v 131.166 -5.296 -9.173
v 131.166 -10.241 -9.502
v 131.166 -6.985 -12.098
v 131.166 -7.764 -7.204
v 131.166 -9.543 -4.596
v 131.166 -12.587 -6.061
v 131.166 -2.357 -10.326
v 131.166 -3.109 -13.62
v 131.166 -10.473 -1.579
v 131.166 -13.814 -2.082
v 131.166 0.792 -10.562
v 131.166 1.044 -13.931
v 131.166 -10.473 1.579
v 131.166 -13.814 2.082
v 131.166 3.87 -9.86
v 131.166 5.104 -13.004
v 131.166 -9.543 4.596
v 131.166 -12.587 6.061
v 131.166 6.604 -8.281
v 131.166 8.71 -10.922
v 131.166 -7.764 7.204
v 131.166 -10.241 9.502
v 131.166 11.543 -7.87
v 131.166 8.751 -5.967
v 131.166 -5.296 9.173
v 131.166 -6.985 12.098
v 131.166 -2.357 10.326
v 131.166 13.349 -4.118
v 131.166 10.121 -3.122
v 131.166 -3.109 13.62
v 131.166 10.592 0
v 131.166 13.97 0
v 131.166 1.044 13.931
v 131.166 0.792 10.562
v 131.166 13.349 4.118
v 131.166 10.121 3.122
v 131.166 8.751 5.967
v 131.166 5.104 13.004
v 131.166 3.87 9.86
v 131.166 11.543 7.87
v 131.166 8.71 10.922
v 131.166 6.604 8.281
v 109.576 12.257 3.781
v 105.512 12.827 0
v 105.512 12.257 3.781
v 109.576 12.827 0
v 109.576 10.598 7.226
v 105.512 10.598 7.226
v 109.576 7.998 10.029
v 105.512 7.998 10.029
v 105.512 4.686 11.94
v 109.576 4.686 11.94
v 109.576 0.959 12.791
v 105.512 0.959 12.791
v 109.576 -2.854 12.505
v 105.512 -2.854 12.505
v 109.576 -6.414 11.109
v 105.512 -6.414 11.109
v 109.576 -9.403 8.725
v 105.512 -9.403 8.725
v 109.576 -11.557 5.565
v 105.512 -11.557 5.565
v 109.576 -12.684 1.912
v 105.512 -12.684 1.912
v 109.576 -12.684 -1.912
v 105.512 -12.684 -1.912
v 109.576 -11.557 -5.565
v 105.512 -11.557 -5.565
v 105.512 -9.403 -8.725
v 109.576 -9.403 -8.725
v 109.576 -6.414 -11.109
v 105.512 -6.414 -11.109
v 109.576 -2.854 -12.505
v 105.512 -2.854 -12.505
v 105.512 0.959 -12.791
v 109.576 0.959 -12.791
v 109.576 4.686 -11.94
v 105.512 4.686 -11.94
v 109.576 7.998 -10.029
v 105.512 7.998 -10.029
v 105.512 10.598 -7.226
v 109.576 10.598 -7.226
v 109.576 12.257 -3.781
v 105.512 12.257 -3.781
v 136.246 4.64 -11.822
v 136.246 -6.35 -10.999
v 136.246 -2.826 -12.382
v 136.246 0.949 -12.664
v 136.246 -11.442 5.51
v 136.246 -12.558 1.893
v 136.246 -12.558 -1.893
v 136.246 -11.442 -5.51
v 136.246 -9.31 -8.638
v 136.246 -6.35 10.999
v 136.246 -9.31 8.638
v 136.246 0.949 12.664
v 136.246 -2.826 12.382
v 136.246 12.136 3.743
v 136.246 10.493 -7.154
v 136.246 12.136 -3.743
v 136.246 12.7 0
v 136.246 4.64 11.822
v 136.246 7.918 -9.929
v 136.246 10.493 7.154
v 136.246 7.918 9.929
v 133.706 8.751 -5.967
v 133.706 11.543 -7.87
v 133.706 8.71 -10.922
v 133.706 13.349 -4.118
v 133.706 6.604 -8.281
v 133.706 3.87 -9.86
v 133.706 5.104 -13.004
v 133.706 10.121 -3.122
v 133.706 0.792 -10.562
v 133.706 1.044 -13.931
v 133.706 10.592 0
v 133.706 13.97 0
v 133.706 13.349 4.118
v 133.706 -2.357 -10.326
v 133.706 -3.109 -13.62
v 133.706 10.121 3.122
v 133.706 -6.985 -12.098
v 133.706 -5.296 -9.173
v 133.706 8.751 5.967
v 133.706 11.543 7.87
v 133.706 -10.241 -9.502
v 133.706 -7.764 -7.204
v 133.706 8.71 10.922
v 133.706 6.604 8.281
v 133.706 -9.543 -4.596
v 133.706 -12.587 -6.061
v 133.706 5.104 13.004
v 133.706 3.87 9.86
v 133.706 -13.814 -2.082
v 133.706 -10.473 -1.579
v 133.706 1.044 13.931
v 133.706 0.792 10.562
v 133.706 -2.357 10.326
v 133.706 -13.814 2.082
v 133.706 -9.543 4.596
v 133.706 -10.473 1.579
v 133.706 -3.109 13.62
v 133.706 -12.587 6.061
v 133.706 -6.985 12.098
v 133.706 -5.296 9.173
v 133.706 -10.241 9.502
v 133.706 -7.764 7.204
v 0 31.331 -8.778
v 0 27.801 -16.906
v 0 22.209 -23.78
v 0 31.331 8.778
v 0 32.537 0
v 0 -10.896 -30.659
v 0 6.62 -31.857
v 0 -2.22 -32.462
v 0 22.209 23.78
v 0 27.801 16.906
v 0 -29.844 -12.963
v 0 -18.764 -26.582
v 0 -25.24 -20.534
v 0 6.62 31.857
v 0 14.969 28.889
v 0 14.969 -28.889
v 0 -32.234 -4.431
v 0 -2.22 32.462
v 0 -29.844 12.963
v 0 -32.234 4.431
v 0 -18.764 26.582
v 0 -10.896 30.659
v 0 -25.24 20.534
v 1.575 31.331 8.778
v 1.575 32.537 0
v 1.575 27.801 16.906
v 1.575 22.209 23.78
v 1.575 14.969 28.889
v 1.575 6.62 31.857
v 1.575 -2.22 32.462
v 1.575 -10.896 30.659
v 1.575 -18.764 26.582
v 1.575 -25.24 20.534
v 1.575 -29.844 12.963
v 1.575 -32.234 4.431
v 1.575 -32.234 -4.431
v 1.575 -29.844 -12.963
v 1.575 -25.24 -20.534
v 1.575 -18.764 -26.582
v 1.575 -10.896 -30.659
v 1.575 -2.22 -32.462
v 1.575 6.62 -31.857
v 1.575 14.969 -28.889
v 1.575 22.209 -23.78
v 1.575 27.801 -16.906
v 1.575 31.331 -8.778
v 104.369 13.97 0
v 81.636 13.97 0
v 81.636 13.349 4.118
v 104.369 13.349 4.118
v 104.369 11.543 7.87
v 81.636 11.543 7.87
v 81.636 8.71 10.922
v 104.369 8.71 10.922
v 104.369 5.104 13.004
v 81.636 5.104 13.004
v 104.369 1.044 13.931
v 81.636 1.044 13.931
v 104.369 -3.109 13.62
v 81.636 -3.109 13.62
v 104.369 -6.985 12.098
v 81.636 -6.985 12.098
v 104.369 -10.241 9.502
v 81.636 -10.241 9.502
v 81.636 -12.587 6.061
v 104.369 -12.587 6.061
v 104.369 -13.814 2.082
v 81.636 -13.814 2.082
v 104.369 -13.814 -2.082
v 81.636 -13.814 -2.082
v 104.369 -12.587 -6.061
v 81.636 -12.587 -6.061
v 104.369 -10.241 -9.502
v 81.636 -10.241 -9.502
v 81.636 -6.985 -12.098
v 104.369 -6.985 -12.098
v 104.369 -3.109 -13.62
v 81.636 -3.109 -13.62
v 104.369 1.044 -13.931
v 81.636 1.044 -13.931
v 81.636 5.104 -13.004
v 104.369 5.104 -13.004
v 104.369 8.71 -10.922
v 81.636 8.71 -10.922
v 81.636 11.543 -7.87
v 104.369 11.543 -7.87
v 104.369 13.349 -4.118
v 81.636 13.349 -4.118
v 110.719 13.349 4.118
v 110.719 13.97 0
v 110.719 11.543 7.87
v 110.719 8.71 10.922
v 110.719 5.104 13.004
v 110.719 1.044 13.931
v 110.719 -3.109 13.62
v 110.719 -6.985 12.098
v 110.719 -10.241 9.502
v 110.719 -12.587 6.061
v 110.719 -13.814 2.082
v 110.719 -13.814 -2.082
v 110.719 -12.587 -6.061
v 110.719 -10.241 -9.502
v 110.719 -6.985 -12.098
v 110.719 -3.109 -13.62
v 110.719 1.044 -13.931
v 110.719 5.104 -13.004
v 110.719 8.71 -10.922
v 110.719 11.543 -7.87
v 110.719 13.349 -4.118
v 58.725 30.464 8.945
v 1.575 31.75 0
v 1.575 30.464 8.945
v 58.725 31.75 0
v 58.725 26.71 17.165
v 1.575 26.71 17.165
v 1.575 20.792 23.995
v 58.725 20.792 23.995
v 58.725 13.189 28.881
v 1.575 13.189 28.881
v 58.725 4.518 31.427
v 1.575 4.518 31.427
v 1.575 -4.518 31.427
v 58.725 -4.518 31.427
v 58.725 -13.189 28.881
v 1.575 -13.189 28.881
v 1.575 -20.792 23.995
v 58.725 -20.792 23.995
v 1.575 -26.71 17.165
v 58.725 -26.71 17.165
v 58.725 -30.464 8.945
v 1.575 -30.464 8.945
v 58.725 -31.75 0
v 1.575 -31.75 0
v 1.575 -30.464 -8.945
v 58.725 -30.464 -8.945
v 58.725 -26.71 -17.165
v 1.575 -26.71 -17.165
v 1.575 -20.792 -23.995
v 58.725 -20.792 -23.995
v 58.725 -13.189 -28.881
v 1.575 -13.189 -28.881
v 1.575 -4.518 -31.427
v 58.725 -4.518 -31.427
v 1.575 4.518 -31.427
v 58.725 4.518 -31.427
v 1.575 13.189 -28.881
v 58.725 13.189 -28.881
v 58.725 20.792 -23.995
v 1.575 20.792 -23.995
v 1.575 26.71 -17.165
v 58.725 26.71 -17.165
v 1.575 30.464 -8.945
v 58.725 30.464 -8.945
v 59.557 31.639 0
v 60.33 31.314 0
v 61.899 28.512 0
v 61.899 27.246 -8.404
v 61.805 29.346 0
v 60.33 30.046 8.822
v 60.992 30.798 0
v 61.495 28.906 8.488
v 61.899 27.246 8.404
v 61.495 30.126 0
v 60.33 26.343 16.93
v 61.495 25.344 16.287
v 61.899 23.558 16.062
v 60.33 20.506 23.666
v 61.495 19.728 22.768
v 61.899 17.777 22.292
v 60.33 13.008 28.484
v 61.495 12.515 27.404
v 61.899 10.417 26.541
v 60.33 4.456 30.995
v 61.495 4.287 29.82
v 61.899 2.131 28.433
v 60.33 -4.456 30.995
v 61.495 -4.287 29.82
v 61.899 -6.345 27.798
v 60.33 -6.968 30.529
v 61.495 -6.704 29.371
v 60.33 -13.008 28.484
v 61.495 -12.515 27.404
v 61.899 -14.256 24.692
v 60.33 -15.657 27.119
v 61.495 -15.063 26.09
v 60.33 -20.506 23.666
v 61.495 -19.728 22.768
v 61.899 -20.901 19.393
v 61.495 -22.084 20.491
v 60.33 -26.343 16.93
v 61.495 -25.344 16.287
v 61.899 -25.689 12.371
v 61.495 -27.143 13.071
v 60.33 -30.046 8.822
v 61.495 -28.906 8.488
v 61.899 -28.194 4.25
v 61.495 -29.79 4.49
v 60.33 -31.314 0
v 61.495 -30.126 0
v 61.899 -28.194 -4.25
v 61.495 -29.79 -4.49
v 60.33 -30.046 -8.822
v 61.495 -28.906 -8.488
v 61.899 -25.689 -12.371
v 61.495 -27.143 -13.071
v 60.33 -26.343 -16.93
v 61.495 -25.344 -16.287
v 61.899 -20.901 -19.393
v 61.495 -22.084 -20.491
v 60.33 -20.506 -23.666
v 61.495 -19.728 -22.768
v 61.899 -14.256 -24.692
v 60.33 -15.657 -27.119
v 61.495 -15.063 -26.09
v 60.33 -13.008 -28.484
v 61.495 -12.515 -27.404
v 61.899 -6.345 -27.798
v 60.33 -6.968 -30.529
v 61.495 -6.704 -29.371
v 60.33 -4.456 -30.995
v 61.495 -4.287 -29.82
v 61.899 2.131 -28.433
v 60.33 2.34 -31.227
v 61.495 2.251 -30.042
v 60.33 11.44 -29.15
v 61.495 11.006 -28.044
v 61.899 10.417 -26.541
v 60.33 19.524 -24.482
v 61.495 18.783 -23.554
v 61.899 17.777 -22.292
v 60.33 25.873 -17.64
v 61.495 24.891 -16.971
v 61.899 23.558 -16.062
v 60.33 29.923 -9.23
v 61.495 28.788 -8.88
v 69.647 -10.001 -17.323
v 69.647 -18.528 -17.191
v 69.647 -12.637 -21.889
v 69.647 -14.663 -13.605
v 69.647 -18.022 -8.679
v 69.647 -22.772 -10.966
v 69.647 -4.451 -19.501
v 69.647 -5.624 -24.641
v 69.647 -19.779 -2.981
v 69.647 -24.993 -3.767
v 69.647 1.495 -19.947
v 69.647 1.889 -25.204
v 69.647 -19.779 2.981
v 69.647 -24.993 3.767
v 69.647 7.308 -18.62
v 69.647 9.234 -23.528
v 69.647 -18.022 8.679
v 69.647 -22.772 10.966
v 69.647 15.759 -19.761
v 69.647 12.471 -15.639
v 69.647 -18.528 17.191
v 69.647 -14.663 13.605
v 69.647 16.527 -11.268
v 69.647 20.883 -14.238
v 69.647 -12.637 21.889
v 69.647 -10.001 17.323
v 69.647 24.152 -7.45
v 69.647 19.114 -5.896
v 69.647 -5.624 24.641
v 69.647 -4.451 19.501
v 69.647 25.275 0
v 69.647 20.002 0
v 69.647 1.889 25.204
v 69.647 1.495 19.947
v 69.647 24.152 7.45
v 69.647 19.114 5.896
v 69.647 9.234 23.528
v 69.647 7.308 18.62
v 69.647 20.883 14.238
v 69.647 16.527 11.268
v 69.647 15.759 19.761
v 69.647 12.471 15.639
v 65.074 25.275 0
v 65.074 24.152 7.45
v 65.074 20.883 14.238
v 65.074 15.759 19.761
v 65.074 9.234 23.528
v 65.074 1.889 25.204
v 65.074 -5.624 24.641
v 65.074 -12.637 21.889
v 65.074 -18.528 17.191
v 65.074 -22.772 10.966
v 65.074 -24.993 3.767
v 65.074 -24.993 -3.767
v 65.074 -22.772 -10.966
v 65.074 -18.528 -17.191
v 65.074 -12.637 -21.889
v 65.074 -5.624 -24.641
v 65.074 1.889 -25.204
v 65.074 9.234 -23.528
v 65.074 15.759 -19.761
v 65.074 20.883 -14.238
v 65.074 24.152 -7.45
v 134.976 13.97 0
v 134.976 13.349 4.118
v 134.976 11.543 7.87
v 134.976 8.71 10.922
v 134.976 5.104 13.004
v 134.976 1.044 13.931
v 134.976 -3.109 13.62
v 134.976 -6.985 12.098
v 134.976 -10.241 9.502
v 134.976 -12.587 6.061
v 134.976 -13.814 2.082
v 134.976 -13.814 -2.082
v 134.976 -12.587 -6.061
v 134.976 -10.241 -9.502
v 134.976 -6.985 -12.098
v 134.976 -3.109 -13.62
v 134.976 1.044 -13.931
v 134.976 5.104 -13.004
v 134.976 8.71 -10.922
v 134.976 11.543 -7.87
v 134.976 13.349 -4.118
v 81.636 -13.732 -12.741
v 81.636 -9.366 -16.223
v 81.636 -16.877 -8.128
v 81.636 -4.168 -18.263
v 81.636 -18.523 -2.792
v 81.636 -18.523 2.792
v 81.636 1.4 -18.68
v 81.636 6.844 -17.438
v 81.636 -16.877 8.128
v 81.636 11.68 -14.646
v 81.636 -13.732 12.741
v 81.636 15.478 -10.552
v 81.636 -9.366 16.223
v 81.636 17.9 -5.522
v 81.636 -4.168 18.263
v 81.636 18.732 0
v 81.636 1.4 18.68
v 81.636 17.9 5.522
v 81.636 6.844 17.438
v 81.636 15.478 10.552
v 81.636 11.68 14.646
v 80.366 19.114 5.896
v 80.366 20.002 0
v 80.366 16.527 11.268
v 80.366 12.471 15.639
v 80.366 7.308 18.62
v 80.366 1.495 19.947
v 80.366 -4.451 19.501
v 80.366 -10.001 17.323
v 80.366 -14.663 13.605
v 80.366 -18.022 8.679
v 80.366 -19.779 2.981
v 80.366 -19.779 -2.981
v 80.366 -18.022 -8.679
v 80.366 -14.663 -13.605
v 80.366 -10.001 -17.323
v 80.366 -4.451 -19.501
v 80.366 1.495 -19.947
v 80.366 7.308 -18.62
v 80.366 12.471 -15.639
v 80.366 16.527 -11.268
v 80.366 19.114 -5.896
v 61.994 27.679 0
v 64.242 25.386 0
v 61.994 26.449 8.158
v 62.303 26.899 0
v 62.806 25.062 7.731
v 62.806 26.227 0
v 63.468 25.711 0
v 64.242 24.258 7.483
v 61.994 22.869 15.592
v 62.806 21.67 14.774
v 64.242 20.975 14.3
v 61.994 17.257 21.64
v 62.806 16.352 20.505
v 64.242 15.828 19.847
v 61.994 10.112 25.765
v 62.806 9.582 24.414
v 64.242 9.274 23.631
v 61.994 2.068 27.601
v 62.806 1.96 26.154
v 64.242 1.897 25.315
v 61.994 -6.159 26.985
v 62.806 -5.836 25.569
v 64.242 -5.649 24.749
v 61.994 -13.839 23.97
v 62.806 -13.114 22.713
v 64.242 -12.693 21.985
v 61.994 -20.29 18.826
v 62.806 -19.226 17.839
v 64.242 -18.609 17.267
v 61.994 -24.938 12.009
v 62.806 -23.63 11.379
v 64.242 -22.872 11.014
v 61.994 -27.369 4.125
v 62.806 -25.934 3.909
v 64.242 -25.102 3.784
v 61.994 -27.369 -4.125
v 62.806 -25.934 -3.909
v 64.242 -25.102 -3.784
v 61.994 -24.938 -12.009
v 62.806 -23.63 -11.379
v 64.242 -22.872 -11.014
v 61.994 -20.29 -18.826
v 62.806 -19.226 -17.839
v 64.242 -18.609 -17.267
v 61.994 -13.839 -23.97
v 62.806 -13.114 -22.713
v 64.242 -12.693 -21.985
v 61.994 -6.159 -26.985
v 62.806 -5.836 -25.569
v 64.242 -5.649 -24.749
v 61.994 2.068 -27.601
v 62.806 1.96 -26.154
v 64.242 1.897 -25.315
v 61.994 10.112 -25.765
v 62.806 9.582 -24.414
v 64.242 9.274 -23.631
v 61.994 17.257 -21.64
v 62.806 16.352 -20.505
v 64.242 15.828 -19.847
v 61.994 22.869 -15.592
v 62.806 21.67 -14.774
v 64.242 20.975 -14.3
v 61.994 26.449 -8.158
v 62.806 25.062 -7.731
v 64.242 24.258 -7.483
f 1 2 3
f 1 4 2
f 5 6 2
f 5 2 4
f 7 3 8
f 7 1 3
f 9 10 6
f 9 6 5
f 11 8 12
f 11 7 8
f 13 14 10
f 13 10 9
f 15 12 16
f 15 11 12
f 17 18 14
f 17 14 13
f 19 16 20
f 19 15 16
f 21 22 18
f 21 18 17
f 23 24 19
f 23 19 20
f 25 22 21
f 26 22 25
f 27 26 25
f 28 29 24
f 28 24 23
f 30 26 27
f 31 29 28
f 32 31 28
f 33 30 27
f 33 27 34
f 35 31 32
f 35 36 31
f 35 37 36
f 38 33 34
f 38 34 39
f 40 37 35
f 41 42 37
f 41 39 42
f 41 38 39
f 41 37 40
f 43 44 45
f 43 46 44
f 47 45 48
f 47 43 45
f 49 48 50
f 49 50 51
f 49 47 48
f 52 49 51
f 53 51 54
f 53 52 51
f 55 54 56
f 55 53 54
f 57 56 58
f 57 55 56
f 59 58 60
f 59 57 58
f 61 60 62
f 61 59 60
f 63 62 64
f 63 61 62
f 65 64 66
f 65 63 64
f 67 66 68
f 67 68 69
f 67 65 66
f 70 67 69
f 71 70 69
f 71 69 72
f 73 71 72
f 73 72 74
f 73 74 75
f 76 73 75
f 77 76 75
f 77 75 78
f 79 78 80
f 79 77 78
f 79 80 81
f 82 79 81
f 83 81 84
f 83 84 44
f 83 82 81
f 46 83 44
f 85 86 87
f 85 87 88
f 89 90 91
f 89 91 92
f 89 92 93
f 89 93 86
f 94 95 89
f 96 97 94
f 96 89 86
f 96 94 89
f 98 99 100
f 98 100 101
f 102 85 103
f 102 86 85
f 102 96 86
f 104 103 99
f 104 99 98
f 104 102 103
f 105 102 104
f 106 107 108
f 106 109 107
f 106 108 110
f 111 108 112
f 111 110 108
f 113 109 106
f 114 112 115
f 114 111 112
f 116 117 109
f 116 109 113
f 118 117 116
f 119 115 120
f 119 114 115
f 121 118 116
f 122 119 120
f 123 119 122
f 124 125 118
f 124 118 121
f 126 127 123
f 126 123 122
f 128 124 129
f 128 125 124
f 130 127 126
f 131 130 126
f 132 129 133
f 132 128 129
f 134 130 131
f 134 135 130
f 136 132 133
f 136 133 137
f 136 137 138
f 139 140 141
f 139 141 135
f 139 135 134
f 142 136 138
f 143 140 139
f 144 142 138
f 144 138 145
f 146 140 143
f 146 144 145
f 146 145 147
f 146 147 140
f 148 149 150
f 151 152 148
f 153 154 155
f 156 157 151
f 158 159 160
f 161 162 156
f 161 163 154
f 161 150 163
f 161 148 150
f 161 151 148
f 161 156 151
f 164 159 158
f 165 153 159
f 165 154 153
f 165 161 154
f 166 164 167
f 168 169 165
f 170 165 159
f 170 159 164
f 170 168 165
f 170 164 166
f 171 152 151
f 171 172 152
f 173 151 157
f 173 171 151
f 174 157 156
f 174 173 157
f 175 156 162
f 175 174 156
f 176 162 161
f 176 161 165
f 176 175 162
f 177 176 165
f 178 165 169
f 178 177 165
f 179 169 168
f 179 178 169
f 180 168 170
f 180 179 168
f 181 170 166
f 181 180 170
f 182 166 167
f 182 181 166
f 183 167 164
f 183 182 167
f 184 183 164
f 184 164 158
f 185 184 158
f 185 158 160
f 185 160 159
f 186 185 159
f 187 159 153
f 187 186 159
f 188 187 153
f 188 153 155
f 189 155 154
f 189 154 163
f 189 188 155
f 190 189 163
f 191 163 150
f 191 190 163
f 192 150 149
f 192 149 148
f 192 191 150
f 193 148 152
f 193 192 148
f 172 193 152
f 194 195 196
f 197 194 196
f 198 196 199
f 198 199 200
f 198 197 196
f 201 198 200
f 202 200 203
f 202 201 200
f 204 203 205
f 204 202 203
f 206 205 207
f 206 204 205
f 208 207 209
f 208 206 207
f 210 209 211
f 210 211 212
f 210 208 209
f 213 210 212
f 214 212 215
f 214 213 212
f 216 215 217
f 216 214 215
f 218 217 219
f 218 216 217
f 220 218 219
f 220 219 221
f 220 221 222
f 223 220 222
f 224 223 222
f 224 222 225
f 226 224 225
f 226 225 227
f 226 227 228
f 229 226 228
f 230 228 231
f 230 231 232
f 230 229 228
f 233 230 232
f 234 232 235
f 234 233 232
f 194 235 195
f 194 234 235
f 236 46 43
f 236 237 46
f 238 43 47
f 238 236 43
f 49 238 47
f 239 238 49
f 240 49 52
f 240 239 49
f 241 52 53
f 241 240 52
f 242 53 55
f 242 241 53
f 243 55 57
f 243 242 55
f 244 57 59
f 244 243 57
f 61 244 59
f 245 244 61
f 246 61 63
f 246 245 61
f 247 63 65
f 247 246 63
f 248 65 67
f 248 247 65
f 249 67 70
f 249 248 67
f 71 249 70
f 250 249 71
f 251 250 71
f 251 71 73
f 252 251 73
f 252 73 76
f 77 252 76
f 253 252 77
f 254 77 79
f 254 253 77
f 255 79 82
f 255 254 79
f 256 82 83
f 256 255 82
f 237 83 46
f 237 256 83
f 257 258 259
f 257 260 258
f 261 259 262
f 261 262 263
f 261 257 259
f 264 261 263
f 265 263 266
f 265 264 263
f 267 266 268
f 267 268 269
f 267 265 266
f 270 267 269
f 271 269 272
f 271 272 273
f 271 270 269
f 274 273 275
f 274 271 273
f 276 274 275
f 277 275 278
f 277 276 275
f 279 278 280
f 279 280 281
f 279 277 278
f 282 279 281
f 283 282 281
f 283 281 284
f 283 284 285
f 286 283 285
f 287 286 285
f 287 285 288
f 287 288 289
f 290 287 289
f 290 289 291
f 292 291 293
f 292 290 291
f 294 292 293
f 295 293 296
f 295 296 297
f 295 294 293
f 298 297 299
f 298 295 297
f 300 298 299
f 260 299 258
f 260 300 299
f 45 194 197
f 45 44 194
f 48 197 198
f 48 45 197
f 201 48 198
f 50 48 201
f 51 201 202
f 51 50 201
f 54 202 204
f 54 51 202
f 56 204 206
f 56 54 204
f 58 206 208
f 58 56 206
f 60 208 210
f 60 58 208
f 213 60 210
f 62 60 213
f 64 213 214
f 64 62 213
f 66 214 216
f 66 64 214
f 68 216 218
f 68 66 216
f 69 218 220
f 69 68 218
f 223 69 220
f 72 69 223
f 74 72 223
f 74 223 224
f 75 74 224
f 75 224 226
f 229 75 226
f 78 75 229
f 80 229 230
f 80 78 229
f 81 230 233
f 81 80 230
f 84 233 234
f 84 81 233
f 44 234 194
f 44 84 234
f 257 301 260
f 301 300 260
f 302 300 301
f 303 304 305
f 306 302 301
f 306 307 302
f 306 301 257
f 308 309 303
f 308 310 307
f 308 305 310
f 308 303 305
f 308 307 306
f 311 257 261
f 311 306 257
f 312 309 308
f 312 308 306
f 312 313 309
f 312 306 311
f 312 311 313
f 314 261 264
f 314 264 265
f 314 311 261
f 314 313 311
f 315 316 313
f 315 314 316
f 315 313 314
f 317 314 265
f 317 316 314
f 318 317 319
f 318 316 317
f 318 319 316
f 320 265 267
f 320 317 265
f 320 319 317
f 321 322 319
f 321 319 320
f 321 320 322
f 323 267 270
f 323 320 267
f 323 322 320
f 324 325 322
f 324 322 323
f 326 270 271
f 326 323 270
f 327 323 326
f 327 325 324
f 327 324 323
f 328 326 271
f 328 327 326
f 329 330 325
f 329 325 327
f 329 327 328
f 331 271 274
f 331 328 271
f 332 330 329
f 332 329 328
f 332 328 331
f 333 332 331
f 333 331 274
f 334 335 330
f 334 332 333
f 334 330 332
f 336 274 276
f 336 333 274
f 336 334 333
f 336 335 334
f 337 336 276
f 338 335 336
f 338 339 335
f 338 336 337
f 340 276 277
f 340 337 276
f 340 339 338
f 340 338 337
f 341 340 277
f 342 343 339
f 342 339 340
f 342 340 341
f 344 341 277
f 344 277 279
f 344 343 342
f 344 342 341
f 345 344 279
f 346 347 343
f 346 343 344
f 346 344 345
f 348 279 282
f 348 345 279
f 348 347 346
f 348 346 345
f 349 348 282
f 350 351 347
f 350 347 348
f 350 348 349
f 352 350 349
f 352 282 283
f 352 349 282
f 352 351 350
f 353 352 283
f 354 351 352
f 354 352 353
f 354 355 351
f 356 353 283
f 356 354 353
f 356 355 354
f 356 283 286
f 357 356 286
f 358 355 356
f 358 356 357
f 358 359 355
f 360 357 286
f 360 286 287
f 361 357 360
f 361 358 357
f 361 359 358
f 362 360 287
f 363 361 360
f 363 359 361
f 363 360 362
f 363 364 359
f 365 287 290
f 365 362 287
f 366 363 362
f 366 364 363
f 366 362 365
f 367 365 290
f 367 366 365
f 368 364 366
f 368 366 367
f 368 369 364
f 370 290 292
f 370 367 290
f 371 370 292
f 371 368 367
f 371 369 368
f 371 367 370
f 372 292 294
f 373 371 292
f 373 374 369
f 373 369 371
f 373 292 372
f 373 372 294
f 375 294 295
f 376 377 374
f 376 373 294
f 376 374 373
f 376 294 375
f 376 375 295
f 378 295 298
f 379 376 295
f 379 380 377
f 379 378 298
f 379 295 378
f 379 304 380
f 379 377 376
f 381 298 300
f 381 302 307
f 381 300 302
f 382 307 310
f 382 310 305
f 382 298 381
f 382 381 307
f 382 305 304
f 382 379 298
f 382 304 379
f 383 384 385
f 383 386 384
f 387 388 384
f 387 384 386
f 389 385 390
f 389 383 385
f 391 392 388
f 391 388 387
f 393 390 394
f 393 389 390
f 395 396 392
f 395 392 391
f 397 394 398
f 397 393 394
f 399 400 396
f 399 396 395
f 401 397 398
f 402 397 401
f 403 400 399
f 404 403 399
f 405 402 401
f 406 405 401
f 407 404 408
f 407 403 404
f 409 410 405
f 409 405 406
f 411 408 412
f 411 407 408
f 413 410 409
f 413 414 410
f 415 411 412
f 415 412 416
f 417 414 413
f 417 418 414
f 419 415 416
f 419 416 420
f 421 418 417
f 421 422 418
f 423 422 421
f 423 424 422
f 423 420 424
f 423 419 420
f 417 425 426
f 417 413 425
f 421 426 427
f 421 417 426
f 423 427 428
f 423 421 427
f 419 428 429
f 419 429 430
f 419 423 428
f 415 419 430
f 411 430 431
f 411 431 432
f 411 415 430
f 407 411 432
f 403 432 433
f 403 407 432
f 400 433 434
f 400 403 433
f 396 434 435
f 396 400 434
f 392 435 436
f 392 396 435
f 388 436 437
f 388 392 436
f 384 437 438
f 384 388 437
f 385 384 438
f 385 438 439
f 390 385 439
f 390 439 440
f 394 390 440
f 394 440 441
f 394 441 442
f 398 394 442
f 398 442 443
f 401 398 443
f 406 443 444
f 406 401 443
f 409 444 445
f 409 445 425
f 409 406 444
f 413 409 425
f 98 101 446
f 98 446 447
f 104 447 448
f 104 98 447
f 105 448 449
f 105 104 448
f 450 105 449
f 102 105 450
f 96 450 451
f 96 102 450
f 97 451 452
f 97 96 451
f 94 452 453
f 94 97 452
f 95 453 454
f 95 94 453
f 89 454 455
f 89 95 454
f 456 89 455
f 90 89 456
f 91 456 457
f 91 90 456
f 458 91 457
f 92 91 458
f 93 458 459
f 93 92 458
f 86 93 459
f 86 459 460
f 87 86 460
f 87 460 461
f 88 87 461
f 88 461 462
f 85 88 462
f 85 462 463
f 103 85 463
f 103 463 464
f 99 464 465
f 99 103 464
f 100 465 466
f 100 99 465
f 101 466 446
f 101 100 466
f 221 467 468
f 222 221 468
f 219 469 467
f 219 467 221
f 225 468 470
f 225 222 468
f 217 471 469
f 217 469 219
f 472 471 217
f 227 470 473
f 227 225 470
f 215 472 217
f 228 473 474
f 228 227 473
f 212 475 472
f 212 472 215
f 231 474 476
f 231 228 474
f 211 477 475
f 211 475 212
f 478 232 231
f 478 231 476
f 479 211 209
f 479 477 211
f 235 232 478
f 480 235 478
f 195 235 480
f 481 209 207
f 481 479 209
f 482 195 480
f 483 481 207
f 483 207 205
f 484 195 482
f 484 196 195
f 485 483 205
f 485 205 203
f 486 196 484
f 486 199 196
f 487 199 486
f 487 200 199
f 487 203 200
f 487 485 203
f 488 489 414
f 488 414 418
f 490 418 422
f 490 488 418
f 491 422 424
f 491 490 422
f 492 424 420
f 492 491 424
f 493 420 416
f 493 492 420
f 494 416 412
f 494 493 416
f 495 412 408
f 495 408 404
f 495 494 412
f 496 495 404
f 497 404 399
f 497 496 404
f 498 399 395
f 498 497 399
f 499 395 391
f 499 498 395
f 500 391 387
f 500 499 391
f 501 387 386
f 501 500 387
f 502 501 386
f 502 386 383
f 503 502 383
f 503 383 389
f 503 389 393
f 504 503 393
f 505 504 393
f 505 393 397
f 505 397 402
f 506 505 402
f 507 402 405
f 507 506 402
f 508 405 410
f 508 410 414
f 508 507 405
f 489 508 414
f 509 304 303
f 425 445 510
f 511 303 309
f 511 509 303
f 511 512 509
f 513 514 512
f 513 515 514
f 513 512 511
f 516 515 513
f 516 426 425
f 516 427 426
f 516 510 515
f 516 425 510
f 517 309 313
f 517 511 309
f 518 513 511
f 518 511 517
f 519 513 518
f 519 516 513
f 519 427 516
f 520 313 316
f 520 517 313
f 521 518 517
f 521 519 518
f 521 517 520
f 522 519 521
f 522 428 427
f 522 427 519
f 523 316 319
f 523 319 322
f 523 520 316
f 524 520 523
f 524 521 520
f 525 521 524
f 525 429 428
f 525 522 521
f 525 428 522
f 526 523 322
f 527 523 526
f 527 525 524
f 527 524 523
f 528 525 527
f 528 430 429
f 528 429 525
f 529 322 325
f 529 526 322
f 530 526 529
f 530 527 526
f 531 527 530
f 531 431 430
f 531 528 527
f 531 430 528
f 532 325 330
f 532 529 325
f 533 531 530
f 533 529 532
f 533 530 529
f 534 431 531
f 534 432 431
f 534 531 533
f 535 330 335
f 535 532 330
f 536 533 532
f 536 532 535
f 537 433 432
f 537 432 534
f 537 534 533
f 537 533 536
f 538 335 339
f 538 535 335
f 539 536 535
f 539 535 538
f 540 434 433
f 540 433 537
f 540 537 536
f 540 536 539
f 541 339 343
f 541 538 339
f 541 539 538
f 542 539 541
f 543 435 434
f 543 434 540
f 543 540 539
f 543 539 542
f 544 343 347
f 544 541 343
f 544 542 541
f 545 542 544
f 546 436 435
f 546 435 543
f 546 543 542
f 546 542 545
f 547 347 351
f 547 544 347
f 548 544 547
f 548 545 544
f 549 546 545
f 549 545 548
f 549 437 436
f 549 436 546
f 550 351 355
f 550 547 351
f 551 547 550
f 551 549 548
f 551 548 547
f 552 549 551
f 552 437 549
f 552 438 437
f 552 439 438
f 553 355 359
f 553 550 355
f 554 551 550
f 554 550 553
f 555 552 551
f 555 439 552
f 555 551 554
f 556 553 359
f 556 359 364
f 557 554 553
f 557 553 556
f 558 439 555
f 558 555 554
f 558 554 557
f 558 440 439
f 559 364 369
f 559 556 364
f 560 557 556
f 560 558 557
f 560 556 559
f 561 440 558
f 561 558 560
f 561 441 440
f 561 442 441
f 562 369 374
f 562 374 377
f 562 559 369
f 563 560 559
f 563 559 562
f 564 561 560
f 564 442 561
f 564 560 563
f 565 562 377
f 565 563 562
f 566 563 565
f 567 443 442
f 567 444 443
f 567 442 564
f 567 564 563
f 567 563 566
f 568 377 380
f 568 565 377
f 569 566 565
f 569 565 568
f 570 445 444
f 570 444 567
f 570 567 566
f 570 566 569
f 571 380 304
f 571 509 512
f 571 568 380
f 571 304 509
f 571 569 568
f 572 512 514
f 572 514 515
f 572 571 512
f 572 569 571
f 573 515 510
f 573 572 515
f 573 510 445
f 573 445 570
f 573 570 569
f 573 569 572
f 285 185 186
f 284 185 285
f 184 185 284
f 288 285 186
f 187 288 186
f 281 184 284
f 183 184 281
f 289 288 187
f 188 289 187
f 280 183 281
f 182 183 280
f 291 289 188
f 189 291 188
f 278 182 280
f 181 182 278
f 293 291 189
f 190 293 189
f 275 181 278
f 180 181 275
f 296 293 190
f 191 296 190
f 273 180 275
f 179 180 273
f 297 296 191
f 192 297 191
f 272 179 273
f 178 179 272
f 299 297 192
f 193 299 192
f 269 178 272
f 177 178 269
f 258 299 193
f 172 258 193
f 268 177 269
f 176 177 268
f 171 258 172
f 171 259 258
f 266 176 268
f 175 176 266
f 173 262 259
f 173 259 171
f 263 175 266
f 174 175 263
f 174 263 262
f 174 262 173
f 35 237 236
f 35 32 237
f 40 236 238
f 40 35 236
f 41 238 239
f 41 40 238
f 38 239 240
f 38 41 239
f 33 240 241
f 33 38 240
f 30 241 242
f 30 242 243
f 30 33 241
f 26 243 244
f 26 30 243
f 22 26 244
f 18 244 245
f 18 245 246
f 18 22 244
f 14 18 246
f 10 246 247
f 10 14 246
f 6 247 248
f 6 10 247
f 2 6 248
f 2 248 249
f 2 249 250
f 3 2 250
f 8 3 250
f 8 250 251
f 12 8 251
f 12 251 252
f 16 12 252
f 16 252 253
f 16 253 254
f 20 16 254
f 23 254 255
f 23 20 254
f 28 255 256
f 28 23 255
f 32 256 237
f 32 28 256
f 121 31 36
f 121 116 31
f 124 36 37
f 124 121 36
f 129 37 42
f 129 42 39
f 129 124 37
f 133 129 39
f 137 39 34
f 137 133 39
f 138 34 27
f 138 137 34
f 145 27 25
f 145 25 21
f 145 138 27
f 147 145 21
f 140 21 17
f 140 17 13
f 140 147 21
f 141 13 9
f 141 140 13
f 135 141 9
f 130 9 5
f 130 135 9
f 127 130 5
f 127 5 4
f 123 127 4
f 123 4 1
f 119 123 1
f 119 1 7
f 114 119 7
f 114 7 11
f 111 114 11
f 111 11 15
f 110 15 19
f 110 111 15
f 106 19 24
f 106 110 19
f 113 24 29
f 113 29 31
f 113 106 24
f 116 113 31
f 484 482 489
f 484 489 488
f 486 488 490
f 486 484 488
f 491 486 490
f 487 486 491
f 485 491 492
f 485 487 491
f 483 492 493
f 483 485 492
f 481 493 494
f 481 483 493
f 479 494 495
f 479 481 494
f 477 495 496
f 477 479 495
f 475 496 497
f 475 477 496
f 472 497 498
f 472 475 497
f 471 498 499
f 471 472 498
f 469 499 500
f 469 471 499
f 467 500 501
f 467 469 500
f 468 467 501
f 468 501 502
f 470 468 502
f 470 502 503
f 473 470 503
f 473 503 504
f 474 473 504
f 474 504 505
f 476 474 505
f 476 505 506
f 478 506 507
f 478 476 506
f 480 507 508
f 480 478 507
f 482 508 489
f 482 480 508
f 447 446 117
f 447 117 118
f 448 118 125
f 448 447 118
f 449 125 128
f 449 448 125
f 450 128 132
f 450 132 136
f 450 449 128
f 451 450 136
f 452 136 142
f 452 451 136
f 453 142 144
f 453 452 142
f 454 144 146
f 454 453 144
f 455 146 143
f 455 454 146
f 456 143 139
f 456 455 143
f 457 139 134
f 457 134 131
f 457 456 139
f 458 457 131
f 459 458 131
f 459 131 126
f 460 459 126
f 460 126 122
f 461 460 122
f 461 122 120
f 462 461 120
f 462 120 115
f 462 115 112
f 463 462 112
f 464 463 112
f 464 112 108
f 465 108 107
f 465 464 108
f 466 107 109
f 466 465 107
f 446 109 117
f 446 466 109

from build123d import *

# Parameters (mm, degrees)
CHAMFER1_SIZE = 1.27


with BuildPart() as part:
    # Sketch1 → Revolve1 (revolve)
    with BuildSketch(Plane.XY):
        with BuildLine():
            Line((0, 0), (0, 32.5374))
            Line((0, 32.5374), (1.5748, 32.5374))
            Line((1.5748, 32.5374), (1.5748, 31.75))
            Line((1.5748, 31.75), (58.7248, 31.75))
            ThreePointArc((58.7248, 31.75), (60.991879668, 30.797830353), (61.899183307, 28.512425058))
            ThreePointArc((61.899183307, 28.512425058), (62.806486945, 26.227019762), (65.073566613, 25.274850115))
            Line((65.073566613, 25.274850115), (69.6468, 25.274850115))
            Line((69.6468, 25.274850115), (69.6468, 20.0025))
            Line((69.6468, 20.0025), (81.6356, 20.0025))
            Line((81.6356, 20.0025), (81.6356, 13.97))
            Line((81.6356, 13.97), (104.3686, 13.97))
            Line((104.3686, 13.97), (105.5116, 12.827))
            Line((105.5116, 12.827), (109.5756, 12.827))
            Line((109.5756, 12.827), (110.7186, 13.97))
            Line((110.7186, 13.97), (131.1656, 13.97))
            Line((131.1656, 13.97), (131.1656, 10.5918))
            Line((131.1656, 10.5918), (133.7056, 10.5918))
            Line((133.7056, 10.5918), (133.7056, 13.97))
            Line((133.7056, 13.97), (136.2456, 13.97))
            Line((136.2456, 13.97), (136.2456, 0))
            Line((136.2456, 0), (0, 0))
        make_face()
    revolve(axis=Axis((-9.339404577, 0, 0), (1, 0, 0)))

    # Chamfer1
    chamfer1_edges = [part.edges().sort_by_distance(p)[0] for p in [
        (81.6356, -20.0025, 0),
        (136.2456, -13.97, 0),
    ]]
    chamfer(chamfer1_edges, length=CHAMFER1_SIZE)


solid = part.part
